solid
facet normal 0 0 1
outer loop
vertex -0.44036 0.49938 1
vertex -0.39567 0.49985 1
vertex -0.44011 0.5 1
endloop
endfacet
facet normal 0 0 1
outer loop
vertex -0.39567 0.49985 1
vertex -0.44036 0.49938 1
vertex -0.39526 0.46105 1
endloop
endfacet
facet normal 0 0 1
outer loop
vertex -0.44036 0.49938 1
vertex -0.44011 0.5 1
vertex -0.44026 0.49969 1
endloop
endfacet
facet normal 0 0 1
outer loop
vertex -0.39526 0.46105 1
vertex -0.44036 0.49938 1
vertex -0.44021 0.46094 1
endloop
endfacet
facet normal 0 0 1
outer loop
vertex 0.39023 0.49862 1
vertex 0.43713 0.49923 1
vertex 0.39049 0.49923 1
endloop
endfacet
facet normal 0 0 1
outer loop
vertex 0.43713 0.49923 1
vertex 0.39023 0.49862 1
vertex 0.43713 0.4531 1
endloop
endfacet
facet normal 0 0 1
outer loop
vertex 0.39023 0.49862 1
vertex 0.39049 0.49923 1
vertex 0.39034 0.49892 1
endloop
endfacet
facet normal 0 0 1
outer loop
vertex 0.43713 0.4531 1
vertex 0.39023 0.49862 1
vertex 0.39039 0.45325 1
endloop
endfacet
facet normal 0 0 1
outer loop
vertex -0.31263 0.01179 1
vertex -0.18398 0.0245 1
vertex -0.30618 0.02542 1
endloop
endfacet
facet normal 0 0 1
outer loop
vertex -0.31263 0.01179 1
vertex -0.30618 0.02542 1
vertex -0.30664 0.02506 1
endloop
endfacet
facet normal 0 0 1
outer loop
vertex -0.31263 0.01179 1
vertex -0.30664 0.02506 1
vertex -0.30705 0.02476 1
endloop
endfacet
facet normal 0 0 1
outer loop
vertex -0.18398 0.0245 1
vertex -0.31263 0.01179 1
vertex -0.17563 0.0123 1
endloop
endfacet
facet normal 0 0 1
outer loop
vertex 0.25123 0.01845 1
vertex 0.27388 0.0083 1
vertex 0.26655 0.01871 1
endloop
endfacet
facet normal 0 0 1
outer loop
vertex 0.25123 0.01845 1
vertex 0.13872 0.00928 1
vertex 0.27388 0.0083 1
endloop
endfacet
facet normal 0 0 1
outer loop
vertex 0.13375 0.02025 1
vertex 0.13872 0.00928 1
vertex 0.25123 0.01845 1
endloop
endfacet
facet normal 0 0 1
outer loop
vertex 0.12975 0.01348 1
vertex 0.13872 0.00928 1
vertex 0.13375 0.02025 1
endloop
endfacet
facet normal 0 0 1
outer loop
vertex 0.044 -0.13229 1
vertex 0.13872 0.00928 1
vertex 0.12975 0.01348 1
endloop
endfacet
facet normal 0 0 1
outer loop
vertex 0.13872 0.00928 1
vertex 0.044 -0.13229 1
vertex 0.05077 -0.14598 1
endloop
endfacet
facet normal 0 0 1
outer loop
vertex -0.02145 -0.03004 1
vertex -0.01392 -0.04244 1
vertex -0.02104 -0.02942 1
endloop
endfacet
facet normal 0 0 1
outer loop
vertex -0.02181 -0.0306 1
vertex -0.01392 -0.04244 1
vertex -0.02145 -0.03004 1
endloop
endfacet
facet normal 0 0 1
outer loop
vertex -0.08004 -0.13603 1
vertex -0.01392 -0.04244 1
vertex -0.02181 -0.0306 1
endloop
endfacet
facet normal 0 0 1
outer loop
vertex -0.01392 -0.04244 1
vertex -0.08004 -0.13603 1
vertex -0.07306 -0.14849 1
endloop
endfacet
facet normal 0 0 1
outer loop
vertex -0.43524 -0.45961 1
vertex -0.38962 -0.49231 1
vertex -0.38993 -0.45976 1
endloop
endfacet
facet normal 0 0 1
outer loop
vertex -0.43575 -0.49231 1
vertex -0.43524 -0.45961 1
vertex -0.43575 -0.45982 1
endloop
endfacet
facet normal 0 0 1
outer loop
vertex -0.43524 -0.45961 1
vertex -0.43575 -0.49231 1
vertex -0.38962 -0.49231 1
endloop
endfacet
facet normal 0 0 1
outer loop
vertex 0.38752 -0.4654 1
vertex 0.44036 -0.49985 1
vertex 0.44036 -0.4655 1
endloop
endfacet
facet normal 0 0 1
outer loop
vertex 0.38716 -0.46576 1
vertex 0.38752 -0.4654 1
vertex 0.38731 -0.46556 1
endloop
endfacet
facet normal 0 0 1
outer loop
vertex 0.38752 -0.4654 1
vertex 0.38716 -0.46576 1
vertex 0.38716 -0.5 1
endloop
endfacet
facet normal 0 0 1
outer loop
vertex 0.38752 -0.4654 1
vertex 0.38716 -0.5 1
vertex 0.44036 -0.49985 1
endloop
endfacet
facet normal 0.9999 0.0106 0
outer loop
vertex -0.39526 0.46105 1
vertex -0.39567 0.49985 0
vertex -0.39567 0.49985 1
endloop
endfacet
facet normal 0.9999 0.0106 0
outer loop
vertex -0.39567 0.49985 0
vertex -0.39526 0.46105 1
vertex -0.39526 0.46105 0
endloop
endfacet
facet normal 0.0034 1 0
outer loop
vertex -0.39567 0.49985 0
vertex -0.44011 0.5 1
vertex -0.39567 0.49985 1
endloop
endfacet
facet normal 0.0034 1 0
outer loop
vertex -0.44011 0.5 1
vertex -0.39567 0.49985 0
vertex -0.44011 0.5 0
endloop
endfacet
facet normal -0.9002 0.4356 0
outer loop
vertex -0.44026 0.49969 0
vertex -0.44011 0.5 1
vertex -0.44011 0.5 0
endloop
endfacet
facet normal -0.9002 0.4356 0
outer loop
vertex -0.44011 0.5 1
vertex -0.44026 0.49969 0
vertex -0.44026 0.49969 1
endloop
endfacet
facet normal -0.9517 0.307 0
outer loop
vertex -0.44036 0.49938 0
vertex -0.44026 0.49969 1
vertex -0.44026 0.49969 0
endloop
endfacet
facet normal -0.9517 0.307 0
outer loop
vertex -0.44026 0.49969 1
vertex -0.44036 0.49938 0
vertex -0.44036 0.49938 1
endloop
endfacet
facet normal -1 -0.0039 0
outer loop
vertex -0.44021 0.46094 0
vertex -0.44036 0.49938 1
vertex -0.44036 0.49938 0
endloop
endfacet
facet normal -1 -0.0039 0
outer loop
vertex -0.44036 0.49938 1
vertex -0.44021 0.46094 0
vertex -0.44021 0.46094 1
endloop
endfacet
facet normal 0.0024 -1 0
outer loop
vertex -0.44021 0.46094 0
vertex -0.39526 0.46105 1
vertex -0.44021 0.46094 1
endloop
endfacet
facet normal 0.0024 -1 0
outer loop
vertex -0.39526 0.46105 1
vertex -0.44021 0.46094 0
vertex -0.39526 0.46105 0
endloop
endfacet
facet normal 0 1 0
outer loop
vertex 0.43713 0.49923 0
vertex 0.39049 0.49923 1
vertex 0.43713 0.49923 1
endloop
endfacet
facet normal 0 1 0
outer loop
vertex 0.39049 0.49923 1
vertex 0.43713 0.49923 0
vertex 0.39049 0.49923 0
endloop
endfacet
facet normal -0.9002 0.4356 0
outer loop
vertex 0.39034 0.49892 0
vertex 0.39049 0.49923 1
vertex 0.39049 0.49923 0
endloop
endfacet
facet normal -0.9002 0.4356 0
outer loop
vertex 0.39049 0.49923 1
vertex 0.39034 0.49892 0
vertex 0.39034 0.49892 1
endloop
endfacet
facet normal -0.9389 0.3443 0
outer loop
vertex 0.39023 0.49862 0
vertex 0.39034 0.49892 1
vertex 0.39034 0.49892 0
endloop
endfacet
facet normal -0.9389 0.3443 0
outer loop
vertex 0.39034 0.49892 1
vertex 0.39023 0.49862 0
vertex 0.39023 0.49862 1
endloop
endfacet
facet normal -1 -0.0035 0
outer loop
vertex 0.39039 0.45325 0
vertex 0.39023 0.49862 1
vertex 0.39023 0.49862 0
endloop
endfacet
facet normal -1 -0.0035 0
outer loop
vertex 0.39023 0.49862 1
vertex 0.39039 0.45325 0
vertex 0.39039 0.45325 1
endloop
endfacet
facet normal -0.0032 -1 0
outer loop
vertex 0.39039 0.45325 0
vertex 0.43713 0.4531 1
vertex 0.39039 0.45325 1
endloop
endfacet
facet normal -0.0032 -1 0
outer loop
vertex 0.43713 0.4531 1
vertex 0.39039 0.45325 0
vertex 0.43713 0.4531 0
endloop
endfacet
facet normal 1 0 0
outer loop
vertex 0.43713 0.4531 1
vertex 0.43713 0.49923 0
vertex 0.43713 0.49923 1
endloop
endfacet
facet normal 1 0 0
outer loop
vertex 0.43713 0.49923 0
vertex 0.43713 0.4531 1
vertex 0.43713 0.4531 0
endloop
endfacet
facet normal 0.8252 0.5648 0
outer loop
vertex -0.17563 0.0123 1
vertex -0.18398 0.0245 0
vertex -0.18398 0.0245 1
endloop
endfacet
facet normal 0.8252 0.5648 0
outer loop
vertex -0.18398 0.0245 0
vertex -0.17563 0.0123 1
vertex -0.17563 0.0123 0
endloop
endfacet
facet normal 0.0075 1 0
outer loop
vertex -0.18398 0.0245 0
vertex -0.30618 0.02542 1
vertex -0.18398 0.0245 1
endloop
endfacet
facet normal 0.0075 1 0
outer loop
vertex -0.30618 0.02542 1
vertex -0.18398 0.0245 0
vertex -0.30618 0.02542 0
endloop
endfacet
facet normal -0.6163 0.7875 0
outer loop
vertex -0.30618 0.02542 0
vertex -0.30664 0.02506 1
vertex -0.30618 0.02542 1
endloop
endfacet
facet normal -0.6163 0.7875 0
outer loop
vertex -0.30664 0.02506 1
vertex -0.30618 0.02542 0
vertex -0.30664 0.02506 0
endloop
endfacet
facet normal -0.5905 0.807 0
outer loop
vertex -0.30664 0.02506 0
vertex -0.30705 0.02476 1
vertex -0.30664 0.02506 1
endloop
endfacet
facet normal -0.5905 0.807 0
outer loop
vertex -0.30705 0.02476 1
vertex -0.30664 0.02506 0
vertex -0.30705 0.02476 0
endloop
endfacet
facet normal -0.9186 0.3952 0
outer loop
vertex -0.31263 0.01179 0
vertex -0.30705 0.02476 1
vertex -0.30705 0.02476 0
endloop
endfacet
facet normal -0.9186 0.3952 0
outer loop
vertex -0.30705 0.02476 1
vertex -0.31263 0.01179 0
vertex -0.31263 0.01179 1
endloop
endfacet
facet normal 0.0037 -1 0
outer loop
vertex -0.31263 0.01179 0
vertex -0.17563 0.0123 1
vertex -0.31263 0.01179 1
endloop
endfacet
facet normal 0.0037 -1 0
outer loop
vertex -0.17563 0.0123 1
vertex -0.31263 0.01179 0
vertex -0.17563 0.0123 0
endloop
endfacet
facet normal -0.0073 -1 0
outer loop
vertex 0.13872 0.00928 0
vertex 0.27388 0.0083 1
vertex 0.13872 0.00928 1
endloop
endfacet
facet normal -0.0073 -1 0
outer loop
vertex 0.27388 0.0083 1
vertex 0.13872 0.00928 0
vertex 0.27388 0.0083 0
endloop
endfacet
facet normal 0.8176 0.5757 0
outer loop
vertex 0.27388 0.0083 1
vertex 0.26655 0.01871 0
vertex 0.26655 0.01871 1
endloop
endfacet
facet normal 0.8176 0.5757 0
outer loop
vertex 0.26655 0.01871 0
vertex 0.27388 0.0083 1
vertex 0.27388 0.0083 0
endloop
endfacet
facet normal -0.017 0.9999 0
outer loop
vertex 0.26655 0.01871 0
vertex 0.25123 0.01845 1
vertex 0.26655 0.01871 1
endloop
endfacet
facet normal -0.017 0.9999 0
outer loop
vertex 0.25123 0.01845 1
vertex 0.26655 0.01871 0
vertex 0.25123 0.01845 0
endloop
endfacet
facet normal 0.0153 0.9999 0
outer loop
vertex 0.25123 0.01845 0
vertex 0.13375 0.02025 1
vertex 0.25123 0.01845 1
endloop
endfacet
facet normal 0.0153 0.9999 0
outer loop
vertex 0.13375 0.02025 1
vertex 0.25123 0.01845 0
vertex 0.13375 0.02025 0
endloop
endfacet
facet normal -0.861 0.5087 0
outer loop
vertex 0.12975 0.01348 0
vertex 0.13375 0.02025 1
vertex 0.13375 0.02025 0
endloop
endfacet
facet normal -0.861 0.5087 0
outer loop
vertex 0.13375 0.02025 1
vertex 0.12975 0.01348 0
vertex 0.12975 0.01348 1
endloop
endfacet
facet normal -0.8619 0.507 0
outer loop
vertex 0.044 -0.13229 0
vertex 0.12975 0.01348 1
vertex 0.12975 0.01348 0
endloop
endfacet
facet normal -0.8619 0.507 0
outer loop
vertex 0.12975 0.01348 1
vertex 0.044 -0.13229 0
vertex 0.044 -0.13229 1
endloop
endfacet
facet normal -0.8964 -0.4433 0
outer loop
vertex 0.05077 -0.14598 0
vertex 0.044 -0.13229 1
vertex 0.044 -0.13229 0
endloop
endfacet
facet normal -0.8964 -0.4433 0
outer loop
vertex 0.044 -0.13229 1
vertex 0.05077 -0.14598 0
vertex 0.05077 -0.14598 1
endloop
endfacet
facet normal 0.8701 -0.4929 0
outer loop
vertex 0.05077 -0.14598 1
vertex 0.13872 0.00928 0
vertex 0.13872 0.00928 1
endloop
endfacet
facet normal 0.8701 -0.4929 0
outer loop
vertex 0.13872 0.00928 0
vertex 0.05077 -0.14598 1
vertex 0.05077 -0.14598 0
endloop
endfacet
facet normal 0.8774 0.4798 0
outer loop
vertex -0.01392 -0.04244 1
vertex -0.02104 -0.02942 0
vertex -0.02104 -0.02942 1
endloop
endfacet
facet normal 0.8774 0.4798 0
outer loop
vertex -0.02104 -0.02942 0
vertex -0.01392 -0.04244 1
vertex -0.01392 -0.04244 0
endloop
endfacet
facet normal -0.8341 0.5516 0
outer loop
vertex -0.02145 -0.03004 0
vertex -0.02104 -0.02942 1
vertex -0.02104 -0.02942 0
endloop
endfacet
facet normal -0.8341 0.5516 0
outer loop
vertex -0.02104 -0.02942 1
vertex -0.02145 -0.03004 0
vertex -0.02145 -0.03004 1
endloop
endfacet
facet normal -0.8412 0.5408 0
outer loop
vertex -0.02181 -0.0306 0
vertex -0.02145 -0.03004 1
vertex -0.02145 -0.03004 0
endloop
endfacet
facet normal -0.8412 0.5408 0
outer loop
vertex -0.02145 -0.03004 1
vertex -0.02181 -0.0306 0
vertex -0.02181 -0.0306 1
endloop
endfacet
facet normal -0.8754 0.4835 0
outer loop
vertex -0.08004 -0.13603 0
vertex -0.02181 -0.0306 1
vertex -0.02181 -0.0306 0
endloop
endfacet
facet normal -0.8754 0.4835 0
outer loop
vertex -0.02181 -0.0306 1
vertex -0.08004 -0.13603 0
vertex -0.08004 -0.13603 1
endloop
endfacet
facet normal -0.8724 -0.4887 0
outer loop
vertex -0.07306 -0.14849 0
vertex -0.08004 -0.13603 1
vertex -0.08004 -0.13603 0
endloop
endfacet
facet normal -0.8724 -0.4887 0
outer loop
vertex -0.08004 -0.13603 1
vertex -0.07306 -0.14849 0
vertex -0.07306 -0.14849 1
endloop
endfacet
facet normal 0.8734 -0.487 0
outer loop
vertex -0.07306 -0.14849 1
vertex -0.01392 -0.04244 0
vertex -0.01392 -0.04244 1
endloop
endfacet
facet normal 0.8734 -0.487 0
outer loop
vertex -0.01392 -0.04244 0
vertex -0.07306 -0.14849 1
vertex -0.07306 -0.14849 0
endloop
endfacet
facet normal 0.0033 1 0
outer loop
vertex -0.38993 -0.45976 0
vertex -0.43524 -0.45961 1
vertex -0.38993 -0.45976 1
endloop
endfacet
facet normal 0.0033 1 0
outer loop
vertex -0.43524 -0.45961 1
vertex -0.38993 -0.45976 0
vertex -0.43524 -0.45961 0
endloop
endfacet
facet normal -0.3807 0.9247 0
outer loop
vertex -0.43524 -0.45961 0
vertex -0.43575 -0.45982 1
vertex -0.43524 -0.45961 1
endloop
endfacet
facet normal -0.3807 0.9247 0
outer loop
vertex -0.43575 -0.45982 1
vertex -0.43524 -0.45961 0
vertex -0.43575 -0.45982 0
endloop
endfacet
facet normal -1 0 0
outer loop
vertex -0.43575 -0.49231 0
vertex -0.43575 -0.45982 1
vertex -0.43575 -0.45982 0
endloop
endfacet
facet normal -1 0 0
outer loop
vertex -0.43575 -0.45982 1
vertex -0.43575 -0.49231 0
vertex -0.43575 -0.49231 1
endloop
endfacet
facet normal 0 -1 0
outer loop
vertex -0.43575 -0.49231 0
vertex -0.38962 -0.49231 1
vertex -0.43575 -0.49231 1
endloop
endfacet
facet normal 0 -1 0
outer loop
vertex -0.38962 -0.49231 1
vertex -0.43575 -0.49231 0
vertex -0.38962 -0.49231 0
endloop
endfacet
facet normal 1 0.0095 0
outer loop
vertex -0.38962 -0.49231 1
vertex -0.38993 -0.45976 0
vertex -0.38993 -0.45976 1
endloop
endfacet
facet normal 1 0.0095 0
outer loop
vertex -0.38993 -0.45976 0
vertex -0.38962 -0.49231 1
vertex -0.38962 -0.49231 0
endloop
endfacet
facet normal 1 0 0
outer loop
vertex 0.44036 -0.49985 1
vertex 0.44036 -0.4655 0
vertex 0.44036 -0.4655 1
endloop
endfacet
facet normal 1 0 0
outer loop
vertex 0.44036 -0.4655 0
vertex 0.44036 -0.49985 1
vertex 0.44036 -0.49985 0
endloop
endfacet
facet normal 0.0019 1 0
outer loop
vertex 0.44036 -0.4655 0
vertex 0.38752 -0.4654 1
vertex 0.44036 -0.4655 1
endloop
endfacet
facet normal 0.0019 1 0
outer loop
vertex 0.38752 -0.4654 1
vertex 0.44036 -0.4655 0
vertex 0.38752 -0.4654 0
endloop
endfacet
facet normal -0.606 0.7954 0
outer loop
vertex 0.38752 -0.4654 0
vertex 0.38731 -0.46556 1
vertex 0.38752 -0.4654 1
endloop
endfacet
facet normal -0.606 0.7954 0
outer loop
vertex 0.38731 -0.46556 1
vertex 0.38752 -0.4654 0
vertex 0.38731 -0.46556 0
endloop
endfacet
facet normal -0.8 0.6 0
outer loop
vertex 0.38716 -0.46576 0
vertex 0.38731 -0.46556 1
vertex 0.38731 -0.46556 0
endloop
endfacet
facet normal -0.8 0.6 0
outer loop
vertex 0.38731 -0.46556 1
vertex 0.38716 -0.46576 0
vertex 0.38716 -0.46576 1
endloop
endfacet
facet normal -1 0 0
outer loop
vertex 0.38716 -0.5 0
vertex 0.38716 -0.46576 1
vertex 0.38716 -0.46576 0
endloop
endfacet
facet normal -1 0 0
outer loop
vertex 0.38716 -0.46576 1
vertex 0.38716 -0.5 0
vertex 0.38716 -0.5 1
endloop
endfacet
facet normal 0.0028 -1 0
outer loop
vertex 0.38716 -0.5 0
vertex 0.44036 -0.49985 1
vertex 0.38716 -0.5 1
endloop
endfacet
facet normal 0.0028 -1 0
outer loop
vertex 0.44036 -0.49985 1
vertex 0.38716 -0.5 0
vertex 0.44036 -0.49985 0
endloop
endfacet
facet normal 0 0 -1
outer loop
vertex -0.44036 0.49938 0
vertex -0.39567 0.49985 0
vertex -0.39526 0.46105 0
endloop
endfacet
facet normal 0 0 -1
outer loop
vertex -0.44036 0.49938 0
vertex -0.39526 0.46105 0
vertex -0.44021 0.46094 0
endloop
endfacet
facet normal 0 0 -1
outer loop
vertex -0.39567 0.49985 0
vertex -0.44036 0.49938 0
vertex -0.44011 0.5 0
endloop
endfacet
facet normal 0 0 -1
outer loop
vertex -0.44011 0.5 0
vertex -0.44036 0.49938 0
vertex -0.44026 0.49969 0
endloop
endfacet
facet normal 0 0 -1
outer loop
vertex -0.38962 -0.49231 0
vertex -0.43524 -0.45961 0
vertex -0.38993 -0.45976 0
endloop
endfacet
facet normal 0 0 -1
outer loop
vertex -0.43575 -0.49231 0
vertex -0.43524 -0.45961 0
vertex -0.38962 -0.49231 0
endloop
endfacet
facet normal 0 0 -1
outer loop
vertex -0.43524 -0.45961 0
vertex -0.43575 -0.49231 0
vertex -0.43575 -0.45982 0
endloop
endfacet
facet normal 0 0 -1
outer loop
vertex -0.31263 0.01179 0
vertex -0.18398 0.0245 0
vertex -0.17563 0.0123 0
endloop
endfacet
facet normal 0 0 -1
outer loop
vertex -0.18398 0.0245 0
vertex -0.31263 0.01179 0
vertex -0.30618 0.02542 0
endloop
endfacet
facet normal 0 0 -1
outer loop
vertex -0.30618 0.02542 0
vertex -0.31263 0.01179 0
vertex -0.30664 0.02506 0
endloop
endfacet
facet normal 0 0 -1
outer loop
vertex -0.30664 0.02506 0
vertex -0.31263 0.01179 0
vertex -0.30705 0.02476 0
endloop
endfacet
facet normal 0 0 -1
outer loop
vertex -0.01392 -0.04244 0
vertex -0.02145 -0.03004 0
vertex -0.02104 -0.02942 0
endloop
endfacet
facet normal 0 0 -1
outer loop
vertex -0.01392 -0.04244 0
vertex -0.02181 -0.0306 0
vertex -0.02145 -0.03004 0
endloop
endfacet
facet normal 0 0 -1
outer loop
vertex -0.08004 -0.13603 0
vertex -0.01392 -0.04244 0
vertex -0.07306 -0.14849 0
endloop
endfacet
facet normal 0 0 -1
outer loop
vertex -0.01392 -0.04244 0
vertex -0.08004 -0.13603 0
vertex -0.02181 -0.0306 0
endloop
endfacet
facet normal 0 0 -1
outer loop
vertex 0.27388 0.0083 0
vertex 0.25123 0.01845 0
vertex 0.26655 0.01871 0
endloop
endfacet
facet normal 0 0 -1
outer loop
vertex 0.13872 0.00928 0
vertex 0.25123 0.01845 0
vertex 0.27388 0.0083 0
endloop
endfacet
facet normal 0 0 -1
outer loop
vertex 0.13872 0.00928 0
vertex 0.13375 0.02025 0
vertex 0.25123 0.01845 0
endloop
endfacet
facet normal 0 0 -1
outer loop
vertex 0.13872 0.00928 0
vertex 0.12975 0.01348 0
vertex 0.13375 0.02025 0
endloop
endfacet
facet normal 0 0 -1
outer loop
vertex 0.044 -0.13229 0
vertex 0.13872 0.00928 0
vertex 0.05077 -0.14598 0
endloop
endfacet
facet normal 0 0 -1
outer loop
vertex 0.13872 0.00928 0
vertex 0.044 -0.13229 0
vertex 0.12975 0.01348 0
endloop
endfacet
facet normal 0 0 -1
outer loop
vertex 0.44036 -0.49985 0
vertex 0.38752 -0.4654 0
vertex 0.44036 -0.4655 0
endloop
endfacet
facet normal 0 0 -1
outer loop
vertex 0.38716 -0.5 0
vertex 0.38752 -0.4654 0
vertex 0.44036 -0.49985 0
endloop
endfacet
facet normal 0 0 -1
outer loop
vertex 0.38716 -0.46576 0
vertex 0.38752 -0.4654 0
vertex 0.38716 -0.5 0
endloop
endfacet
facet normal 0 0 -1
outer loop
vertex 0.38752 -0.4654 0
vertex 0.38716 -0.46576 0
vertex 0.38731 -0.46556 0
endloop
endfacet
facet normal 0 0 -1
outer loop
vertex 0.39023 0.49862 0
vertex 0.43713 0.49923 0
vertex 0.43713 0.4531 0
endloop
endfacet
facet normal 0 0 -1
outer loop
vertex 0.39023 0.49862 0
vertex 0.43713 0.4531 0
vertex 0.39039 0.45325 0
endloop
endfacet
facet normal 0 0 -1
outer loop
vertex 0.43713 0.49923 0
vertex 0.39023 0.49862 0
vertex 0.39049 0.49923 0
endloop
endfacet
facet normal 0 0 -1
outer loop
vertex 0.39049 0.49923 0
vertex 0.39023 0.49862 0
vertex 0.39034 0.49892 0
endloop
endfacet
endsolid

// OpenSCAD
module WibbyUpperShadow_1()
{
 /* Generated by trace2scad version 20150415
    http://aggregate.org/MAKE/TRACE2SCAD/
    Optimized model has 45/257 original points
 */
 color([0.5, 0.5, 0.5])
 assign(minx=285) /* polygon minx=285 */
 assign(miny=200) /* polygon miny=200 */
 assign(maxx=17468) /* polygon maxx=17468 */
 assign(maxy=19710) /* polygon maxy=19710 */
 assign(dx=maxx-minx)
 assign(dy=maxy-miny)
 assign(maxd=((dx>dy)?dx:dy))
 scale([1/maxd, 1/maxd, 1])
 translate([-minx-dx/2, -miny-dy/2, 0])
 linear_extrude(height=1, convexity=45)
 union() {
  union() {
   polygon([[287,19704],[285,19698],[288,18948],[1165,18950],[1157,19707],[290,19710]], convexity=6);
   polygon([[16492,19689],[16490,19683],[16493,18798],[17405,18795],[17405,19695],[16495,19695]], convexity=6);
   polygon([[2894,10444],[2886,10438],[2777,10185],[5450,10195],[5287,10433],[2903,10451]], convexity=5);
   polygon([[11447,10284],[11408,10218],[9735,7374],[9867,7107],[11583,10136],[14220,10117],[14077,10320],[13778,10315],[11486,10350]], convexity=9);
   polygon([[8458,9369],[8451,9358],[7315,7301],[7451,7058],[8605,9127],[8466,9381]], convexity=6);
   polygon([[380,986],[375,984],[375,350],[1275,350],[1269,985],[385,988]], convexity=6);
   polygon([[16433,872],[16430,868],[16430,200],[17468,203],[17468,873],[16437,875]], convexity=6);
  }
 }
}

module WibbyUpperShadow()
{
 /* all layers combined, scaled to within a 1mm cube */
 scale([1, 1, 1/1])
 difference() {
  union() {
   scale([1,1,2]) translate([0,0,-0.5]) WibbyUpperShadow_1();
  }
  translate([0,0,-2]) cube([2,2,4],center=true);
 }
}
WibbyUpperShadow();
